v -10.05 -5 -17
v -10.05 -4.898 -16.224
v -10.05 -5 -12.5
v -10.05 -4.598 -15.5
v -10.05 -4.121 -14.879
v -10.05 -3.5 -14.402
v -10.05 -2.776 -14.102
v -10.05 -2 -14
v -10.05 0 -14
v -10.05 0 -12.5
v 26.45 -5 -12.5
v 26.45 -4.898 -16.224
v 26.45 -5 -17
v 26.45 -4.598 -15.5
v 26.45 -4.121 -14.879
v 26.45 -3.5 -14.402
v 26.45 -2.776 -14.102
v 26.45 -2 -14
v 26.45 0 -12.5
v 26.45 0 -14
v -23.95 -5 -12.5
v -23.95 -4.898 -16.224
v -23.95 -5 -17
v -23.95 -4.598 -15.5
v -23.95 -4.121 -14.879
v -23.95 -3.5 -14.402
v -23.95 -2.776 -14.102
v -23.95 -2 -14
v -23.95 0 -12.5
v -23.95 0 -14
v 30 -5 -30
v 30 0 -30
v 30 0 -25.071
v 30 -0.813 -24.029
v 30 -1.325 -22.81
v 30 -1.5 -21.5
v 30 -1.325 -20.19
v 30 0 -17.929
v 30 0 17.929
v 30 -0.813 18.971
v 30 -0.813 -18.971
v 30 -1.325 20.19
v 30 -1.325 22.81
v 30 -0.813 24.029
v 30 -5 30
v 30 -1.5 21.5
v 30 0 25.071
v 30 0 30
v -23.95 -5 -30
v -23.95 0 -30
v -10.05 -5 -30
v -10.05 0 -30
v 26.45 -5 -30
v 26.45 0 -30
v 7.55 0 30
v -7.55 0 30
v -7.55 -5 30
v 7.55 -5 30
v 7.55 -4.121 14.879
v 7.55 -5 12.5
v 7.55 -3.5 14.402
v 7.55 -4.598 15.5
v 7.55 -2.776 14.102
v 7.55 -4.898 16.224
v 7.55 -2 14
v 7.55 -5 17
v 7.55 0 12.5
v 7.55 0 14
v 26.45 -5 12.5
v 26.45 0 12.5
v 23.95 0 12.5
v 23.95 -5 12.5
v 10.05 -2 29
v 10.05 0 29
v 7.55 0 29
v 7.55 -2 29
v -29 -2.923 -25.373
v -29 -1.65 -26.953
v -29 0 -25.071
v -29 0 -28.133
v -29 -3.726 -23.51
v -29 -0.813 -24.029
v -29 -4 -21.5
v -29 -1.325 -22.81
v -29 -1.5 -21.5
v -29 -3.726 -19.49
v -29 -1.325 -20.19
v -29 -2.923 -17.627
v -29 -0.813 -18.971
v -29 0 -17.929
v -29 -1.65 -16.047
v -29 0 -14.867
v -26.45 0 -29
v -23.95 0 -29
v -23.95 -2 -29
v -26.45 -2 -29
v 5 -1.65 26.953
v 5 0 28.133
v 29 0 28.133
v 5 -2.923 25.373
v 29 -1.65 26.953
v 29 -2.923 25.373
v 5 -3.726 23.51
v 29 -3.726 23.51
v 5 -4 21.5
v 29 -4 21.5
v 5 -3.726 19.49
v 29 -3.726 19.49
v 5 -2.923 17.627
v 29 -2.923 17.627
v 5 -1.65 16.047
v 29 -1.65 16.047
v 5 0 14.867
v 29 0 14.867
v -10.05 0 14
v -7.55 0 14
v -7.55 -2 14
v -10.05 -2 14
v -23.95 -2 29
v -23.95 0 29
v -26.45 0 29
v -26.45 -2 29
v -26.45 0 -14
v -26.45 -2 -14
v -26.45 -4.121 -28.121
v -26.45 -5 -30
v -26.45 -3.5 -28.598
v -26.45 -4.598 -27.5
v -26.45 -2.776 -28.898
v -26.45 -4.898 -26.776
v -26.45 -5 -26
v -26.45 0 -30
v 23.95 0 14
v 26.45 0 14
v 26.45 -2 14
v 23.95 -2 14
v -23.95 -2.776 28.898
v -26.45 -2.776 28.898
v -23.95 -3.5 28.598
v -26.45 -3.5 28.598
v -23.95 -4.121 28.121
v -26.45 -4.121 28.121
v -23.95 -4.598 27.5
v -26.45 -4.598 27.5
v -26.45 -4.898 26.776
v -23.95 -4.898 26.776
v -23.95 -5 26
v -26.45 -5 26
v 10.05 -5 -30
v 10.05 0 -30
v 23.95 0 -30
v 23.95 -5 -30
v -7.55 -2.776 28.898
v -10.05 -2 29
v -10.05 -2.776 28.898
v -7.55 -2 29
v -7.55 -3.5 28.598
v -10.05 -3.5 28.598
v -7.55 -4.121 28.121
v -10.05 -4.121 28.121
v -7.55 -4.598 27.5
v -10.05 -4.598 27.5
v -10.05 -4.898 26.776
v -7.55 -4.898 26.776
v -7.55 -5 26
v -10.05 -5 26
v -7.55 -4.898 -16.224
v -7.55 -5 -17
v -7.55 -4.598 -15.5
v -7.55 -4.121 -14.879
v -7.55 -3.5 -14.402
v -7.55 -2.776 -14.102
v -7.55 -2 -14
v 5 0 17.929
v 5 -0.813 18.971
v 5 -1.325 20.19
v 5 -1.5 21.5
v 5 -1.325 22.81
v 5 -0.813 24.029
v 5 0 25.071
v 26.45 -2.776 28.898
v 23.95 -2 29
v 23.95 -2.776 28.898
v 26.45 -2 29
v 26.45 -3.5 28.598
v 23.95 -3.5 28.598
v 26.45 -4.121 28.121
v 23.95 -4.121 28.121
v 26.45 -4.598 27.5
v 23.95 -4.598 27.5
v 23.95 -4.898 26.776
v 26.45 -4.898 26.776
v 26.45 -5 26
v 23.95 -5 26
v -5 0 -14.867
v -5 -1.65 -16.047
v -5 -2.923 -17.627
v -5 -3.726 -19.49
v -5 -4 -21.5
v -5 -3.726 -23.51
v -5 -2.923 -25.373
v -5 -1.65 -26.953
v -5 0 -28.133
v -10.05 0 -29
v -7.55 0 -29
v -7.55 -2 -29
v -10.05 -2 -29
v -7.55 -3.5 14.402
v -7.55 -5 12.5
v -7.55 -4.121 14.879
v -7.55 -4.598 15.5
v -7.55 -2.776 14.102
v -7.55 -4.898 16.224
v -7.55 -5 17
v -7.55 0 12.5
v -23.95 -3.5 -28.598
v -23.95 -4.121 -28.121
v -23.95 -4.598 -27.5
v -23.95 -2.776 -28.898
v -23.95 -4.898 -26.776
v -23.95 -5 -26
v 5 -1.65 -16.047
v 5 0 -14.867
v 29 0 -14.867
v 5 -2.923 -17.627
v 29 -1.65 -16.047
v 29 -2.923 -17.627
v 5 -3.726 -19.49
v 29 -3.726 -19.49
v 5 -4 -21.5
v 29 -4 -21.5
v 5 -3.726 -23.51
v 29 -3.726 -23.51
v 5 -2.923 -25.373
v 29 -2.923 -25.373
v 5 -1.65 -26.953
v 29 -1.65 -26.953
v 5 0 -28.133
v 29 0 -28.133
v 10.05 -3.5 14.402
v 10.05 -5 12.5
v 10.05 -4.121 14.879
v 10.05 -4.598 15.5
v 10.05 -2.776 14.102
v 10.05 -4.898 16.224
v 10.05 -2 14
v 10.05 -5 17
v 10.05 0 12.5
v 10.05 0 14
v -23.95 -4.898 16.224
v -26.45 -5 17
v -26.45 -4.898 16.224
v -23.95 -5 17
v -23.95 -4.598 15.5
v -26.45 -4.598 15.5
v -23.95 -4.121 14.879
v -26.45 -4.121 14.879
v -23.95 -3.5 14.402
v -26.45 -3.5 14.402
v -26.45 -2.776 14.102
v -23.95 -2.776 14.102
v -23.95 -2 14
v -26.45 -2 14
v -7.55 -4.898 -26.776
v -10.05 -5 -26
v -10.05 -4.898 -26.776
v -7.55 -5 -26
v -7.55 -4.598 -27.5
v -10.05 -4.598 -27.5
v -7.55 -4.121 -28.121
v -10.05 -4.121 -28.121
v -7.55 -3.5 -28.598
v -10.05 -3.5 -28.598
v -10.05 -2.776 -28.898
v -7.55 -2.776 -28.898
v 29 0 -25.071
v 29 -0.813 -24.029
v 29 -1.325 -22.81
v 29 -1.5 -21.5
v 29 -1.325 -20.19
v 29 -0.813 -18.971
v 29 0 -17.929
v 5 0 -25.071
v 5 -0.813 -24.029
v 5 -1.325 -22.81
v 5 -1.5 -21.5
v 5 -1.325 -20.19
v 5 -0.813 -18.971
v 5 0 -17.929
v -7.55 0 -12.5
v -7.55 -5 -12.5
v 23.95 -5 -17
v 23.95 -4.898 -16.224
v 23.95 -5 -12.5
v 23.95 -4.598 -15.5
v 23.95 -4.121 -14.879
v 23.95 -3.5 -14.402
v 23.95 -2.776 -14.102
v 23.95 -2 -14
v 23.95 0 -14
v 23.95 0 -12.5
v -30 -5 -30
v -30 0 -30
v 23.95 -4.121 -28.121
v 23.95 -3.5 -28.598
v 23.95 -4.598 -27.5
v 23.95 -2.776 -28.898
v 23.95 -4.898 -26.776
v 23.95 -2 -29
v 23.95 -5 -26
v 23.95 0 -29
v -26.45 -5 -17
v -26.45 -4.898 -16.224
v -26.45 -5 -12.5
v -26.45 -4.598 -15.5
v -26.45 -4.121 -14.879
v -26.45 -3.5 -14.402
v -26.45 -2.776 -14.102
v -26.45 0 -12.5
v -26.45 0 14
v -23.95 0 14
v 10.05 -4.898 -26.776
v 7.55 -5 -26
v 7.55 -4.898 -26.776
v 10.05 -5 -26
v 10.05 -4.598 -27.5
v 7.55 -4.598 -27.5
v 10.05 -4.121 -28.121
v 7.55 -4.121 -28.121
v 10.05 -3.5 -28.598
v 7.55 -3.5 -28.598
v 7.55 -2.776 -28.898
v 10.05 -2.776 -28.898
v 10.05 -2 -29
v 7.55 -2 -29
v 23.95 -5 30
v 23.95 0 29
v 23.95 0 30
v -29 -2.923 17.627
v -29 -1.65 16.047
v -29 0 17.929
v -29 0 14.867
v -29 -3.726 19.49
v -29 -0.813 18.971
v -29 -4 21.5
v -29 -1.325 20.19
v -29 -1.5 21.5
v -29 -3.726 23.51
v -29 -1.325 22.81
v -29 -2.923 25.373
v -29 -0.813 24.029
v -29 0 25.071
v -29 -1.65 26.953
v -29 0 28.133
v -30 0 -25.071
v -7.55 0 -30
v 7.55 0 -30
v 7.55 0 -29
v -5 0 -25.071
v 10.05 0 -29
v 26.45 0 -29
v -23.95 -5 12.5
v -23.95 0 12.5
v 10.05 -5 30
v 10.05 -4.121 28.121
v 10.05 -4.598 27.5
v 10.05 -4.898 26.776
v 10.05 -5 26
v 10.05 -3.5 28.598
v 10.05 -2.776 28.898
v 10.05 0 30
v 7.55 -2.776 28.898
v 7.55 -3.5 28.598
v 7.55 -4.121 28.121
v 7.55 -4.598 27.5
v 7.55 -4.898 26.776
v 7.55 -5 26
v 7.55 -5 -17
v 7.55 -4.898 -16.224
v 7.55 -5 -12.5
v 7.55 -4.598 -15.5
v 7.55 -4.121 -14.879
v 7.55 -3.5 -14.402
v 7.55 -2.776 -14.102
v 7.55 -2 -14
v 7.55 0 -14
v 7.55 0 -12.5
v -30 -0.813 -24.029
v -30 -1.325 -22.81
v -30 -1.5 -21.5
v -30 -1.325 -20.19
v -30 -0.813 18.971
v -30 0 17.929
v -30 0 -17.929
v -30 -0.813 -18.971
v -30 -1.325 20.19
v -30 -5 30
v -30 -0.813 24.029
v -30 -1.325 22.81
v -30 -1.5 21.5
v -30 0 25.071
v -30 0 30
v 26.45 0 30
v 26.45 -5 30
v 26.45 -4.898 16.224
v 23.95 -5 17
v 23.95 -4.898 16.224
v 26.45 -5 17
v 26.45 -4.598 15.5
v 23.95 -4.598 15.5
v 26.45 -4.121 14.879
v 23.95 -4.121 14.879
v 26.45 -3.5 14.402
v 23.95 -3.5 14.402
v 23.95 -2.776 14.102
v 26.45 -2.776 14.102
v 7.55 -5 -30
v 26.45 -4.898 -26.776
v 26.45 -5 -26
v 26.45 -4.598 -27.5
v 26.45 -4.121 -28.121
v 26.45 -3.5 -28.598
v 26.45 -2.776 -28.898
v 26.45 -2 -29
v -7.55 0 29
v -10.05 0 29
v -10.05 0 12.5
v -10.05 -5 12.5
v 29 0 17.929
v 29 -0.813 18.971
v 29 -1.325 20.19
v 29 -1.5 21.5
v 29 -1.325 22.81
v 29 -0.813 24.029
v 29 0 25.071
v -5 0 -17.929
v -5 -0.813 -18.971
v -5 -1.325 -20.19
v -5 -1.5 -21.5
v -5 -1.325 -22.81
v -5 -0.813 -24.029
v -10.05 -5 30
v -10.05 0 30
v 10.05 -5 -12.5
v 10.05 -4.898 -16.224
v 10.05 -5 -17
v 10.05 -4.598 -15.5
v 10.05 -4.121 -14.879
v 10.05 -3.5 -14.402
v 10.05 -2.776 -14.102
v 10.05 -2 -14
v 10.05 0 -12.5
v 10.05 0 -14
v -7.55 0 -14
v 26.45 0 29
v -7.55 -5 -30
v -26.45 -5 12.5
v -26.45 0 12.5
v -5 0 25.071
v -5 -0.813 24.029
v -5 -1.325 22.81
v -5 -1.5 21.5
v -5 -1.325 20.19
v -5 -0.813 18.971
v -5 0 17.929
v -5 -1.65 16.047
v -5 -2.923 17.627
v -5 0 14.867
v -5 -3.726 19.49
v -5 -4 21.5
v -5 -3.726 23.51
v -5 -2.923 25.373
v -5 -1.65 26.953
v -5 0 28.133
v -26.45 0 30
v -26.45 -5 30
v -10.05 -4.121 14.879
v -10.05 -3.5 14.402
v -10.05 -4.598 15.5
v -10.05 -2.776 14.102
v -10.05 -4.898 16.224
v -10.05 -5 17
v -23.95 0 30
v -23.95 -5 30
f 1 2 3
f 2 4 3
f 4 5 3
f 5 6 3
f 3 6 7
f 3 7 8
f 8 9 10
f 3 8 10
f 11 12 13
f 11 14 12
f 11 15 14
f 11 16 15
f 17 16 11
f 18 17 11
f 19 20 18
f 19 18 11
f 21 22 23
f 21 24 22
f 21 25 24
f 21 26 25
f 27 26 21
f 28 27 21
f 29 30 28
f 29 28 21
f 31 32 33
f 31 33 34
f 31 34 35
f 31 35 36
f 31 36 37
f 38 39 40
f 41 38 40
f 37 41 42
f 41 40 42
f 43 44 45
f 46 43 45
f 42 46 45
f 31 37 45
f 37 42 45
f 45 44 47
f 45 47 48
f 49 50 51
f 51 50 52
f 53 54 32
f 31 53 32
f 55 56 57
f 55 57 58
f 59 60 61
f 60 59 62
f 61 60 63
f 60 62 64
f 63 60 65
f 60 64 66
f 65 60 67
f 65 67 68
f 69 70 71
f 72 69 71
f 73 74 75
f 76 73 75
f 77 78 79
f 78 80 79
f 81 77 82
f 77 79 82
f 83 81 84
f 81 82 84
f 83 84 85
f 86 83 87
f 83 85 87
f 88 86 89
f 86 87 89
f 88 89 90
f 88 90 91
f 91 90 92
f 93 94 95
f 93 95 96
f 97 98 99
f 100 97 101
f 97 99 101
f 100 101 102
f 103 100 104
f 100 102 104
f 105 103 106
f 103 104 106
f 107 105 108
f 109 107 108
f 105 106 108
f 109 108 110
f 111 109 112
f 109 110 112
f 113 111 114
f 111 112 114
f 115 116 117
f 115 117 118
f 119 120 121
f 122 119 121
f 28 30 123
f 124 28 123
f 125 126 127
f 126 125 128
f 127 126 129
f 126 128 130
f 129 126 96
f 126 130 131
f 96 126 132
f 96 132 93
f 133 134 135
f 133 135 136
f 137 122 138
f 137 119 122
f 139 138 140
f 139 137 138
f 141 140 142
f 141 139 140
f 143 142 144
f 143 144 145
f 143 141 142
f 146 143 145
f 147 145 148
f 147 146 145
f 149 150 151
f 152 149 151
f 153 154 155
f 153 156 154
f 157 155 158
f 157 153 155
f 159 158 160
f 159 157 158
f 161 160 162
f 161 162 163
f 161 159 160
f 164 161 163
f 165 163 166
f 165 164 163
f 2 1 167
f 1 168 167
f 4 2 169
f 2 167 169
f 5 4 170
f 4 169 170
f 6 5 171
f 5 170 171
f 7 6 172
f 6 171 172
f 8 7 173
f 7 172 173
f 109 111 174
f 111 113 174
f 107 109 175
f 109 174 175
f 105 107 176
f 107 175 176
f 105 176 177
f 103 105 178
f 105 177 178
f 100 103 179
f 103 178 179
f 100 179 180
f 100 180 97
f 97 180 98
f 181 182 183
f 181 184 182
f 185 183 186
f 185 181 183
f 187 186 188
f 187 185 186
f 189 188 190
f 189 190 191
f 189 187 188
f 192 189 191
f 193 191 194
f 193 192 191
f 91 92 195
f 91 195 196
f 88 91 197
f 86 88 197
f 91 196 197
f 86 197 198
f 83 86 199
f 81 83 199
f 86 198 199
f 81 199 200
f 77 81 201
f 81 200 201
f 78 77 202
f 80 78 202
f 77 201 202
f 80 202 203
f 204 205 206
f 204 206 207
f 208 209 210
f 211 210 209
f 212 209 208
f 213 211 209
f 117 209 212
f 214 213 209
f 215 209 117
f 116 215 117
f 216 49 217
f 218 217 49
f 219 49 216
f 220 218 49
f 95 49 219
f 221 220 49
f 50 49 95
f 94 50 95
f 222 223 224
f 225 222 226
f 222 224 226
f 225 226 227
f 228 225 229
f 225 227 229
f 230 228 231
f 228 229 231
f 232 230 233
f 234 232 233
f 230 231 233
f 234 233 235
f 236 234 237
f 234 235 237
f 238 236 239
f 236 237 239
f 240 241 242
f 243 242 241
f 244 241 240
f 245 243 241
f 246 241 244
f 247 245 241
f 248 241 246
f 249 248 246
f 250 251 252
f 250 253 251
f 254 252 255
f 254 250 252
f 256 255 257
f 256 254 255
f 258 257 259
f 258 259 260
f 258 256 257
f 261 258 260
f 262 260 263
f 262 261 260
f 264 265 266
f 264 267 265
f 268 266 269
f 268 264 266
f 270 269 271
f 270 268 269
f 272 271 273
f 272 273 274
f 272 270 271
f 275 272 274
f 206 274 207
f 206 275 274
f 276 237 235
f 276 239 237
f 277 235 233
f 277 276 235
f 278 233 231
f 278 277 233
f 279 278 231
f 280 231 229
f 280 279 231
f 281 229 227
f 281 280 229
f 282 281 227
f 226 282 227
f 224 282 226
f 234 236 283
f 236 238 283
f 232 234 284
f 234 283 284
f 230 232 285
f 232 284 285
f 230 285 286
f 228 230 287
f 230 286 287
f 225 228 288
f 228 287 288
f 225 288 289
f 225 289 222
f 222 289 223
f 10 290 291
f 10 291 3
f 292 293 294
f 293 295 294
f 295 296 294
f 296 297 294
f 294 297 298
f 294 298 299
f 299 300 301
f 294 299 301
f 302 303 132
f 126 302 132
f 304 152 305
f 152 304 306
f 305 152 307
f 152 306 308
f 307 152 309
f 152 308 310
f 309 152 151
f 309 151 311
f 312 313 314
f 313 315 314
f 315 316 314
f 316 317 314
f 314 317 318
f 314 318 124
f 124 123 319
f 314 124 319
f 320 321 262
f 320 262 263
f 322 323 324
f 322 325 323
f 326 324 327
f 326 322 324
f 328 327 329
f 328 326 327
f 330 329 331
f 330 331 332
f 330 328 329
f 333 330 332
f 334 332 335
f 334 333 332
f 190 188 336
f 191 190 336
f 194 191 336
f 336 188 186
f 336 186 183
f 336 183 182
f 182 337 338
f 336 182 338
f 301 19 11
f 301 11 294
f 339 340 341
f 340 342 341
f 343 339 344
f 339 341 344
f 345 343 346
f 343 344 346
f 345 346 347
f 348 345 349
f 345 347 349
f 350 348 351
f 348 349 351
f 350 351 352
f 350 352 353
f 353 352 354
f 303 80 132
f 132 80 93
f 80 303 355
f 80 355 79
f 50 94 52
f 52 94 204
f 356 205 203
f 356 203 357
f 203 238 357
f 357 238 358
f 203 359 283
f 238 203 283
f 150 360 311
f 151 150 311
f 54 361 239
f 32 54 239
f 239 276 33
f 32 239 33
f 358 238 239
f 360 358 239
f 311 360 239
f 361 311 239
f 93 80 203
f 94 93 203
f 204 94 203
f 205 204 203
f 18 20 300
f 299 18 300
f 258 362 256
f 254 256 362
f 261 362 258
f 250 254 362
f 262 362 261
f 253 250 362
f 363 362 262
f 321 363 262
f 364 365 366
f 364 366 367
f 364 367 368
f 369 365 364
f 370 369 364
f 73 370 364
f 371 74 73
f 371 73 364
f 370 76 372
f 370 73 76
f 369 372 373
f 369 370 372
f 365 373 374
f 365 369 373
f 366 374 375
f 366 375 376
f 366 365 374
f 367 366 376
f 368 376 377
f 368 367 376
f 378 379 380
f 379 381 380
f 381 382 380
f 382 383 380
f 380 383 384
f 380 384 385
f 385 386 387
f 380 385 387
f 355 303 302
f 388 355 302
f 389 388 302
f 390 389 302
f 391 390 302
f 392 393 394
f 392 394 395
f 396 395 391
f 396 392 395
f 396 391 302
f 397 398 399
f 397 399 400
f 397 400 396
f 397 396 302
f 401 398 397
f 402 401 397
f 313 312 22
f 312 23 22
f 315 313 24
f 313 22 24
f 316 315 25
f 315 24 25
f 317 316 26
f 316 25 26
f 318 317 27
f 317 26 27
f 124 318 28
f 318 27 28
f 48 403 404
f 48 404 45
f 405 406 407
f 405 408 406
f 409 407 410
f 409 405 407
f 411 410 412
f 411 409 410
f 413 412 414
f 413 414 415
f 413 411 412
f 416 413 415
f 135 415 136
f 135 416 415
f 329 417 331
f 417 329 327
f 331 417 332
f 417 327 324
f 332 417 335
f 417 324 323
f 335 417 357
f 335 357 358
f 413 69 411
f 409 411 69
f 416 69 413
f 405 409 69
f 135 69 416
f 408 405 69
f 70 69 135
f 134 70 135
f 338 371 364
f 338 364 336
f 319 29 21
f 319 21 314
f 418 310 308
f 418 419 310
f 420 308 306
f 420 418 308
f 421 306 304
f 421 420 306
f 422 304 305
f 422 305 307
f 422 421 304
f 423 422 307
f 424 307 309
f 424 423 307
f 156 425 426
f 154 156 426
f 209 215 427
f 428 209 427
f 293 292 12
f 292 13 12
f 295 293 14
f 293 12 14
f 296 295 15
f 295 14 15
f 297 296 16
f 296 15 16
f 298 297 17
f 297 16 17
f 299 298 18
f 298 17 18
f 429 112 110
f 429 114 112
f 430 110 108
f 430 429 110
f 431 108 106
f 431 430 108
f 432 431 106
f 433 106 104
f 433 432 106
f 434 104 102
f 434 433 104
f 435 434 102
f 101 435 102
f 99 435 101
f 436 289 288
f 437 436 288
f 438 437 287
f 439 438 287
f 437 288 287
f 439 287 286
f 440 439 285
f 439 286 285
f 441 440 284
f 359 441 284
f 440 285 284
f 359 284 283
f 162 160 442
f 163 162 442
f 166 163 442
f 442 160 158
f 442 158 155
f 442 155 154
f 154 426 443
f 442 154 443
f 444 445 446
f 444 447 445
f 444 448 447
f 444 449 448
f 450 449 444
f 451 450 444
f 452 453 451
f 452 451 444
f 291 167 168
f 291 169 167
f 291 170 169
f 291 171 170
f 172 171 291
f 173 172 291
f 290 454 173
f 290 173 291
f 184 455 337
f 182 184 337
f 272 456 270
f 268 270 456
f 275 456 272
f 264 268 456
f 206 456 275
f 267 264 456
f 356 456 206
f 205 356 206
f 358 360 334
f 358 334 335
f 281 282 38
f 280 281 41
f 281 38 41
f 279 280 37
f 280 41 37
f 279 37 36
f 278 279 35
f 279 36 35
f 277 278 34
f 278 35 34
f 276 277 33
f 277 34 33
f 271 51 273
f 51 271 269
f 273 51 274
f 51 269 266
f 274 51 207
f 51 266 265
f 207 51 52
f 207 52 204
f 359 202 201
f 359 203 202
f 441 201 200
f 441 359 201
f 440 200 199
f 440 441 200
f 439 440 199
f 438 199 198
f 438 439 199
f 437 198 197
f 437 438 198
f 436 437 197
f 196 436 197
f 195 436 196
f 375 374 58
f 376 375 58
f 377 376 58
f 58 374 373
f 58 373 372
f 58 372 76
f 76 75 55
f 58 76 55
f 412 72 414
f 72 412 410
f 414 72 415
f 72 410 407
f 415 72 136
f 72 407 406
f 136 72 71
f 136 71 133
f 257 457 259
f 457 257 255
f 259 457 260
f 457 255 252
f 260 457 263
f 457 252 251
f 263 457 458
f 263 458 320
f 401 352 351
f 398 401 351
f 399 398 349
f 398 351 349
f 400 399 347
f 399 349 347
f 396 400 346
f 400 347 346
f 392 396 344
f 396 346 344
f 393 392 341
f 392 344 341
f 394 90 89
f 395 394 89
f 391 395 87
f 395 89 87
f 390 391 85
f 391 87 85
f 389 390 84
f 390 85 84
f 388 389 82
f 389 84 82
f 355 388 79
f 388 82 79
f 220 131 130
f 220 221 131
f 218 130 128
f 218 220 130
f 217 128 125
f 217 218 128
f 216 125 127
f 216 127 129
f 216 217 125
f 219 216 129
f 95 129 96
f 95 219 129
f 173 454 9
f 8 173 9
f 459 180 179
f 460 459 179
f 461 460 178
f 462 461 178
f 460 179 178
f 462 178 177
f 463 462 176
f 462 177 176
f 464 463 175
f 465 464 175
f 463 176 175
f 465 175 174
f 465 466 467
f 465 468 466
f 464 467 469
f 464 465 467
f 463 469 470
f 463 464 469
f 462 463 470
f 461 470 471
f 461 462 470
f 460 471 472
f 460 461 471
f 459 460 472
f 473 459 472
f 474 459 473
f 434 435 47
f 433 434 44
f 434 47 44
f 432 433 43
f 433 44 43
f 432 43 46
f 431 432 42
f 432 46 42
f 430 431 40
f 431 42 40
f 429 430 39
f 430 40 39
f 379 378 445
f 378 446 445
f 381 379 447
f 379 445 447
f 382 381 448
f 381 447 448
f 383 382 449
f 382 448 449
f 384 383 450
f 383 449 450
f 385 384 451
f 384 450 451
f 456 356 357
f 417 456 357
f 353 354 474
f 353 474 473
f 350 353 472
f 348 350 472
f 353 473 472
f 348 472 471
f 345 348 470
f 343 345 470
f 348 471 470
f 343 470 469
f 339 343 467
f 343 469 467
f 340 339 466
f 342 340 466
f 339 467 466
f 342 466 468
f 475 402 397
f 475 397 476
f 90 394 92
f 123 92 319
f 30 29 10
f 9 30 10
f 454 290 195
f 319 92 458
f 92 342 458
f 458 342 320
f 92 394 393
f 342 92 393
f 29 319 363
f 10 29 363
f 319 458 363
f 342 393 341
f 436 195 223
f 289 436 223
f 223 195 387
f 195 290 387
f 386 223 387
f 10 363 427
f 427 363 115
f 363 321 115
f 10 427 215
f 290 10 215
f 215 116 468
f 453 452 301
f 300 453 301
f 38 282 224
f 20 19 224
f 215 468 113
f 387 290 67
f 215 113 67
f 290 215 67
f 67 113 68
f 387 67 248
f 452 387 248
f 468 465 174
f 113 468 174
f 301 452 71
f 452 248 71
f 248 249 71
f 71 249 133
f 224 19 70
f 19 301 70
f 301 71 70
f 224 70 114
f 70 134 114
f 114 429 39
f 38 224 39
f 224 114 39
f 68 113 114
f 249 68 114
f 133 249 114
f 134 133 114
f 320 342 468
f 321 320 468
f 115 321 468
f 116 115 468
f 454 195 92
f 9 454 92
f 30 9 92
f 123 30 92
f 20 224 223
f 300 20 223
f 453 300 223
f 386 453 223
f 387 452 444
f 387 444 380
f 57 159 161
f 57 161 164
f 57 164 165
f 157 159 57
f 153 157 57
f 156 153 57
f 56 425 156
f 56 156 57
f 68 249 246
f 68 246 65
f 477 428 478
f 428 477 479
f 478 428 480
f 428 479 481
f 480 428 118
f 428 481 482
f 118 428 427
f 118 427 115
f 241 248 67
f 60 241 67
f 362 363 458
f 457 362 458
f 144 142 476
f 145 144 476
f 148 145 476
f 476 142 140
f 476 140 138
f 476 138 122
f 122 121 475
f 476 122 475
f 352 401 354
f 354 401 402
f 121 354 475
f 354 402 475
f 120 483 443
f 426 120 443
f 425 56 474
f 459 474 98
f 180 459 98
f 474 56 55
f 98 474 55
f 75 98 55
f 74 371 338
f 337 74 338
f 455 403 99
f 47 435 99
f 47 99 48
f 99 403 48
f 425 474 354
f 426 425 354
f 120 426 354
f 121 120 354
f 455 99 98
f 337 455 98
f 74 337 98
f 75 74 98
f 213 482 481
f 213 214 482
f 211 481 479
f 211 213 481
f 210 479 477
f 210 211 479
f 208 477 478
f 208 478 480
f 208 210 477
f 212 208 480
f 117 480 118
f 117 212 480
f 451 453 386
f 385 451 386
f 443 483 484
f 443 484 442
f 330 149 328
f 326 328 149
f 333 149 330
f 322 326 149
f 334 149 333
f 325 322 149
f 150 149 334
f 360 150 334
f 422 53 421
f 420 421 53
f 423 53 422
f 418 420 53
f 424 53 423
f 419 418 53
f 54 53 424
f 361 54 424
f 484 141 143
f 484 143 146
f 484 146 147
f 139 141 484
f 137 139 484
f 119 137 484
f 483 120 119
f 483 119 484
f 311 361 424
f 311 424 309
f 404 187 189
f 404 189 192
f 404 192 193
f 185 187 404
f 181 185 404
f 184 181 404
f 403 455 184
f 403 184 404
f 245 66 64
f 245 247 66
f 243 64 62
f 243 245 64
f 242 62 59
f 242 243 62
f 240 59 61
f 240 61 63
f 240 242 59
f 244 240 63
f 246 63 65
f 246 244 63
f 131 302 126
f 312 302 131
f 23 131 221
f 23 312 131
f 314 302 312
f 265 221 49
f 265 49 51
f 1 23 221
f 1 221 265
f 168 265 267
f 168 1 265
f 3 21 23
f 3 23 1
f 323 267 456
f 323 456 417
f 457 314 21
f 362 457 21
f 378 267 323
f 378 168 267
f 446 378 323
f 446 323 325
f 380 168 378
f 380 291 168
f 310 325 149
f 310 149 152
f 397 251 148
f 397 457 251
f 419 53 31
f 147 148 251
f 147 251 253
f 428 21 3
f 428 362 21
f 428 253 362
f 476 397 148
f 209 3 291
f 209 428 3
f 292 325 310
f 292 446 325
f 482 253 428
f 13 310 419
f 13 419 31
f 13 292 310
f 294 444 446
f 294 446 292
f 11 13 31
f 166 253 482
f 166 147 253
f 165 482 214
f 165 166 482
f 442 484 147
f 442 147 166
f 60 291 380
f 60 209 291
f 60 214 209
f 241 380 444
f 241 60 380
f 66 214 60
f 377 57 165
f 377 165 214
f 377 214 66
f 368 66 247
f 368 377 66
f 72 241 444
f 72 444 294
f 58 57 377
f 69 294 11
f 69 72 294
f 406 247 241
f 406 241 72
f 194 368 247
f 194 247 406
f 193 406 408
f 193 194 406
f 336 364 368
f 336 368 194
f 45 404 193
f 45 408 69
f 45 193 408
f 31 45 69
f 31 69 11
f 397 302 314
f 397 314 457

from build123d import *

# Parameters (mm, degrees)
F0_W     = 60
F0_H     = 60
F1_DEPTH = 5
F2_R     = 7.5
F3_DEPTH = 60.001
F4_W     = 1
F4_H     = 60
F4_W_2   = 10
F5_DEPTH = 5
F6_R     = 5
F7_DEPTH = 60.001
F8_W     = 2.5
F8_H     = 1.5
F9_DEPTH = 5.001
F10_R    = 3


with BuildPart() as f1:
    # F0 (on Front) → F1 (new body)
    with BuildSketch(Plane.XZ):
        Rectangle(F0_W, F0_H)
    extrude(amount=F1_DEPTH)

    # F2 (on face) → F3 (cut, through all)
    with BuildSketch(Plane.YZ.offset(30)):
        with Locations((3.5, 21.5)):
            Circle(F2_R)
        with Locations((3.5, -21.5)):
            Circle(F2_R)
    extrude(amount=-F3_DEPTH, mode=Mode.SUBTRACT)

    # F4 (on face) → F5 (join)
    with BuildSketch(Plane(origin=(0, 0, 0), x_dir=(-1, 0, 0), z_dir=(0, 1, 0))):
        with Locations((-29.5, 0)):
            Rectangle(F4_W, F4_H)
        Rectangle(F4_W_2, F4_H)
        with Locations((29.5, 0)):
            Rectangle(F4_W, F4_H)
    extrude(amount=-F5_DEPTH)

    # F6 (on face) → F7 (cut, through all)
    with BuildSketch(Plane.YZ.offset(30)):
        with Locations((3.5, 21.5)):
            Circle(F6_R)
        with Locations((3.5, -21.5)):
            Circle(F6_R)
    extrude(amount=-F7_DEPTH, mode=Mode.SUBTRACT)

    # F8 (on face) → F9 (cut, through all)
    with BuildSketch(Plane(origin=(0, 0, 0), x_dir=(-1, 0, 0), z_dir=(0, 1, 0))):
        with Locations((-25.2, 13.25)):
            Rectangle(F8_W, F8_H)
        with Locations((-8.8, 13.25)):
            Rectangle(F8_W, F8_H)
        with Locations((-8.8, 29.75)):
            Rectangle(F8_W, F8_H)
        with Locations((-25.2, 29.75)):
            Rectangle(F8_W, F8_H)
        with Locations((25.2, 29.75)):
            Rectangle(F8_W, F8_H)
        with Locations((8.8, 13.25)):
            Rectangle(F8_W, F8_H)
        with Locations((8.8, 29.75)):
            Rectangle(F8_W, F8_H)
        with Locations((25.2, 13.25)):
            Rectangle(F8_W, F8_H)
        with Locations((-8.8, -13.25)):
            Rectangle(F8_W, F8_H)
        with Locations((8.8, -29.75)):
            Rectangle(F8_W, F8_H)
        with Locations((25.2, -13.25)):
            Rectangle(F8_W, F8_H)
        with Locations((25.2, -29.75)):
            Rectangle(F8_W, F8_H)
        with Locations((8.8, -13.25)):
            Rectangle(F8_W, F8_H)
        with Locations((-25.2, -13.25)):
            Rectangle(F8_W, F8_H)
        with Locations((-25.2, -29.75)):
            Rectangle(F8_W, F8_H)
        with Locations((-8.8, -29.75)):
            Rectangle(F8_W, F8_H)
    extrude(amount=-F9_DEPTH, mode=Mode.SUBTRACT)

    # F10
    f10_edges = [f1.edges().sort_by_distance(p)[0] for p in [
        (25.2, -5, -29),
        (25.2, -5, -14),
        (8.8, -5, -14),
        (8.8, -5, -29),
        (-8.8, -5, -29),
        (-8.8, -5, -14),
        (-25.2, -5, -14),
        (-25.2, -5, -29),
        (-25.2, -5, 14),
        (-8.8, -5, 14),
        (-8.8, -5, 29),
        (-25.2, -5, 29),
        (8.8, -5, 14),
        (8.8, -5, 29),
        (25.2, -5, 29),
        (25.2, -5, 14),
    ]]
    fillet(f10_edges, radius=F10_R)


solid = f1.part
